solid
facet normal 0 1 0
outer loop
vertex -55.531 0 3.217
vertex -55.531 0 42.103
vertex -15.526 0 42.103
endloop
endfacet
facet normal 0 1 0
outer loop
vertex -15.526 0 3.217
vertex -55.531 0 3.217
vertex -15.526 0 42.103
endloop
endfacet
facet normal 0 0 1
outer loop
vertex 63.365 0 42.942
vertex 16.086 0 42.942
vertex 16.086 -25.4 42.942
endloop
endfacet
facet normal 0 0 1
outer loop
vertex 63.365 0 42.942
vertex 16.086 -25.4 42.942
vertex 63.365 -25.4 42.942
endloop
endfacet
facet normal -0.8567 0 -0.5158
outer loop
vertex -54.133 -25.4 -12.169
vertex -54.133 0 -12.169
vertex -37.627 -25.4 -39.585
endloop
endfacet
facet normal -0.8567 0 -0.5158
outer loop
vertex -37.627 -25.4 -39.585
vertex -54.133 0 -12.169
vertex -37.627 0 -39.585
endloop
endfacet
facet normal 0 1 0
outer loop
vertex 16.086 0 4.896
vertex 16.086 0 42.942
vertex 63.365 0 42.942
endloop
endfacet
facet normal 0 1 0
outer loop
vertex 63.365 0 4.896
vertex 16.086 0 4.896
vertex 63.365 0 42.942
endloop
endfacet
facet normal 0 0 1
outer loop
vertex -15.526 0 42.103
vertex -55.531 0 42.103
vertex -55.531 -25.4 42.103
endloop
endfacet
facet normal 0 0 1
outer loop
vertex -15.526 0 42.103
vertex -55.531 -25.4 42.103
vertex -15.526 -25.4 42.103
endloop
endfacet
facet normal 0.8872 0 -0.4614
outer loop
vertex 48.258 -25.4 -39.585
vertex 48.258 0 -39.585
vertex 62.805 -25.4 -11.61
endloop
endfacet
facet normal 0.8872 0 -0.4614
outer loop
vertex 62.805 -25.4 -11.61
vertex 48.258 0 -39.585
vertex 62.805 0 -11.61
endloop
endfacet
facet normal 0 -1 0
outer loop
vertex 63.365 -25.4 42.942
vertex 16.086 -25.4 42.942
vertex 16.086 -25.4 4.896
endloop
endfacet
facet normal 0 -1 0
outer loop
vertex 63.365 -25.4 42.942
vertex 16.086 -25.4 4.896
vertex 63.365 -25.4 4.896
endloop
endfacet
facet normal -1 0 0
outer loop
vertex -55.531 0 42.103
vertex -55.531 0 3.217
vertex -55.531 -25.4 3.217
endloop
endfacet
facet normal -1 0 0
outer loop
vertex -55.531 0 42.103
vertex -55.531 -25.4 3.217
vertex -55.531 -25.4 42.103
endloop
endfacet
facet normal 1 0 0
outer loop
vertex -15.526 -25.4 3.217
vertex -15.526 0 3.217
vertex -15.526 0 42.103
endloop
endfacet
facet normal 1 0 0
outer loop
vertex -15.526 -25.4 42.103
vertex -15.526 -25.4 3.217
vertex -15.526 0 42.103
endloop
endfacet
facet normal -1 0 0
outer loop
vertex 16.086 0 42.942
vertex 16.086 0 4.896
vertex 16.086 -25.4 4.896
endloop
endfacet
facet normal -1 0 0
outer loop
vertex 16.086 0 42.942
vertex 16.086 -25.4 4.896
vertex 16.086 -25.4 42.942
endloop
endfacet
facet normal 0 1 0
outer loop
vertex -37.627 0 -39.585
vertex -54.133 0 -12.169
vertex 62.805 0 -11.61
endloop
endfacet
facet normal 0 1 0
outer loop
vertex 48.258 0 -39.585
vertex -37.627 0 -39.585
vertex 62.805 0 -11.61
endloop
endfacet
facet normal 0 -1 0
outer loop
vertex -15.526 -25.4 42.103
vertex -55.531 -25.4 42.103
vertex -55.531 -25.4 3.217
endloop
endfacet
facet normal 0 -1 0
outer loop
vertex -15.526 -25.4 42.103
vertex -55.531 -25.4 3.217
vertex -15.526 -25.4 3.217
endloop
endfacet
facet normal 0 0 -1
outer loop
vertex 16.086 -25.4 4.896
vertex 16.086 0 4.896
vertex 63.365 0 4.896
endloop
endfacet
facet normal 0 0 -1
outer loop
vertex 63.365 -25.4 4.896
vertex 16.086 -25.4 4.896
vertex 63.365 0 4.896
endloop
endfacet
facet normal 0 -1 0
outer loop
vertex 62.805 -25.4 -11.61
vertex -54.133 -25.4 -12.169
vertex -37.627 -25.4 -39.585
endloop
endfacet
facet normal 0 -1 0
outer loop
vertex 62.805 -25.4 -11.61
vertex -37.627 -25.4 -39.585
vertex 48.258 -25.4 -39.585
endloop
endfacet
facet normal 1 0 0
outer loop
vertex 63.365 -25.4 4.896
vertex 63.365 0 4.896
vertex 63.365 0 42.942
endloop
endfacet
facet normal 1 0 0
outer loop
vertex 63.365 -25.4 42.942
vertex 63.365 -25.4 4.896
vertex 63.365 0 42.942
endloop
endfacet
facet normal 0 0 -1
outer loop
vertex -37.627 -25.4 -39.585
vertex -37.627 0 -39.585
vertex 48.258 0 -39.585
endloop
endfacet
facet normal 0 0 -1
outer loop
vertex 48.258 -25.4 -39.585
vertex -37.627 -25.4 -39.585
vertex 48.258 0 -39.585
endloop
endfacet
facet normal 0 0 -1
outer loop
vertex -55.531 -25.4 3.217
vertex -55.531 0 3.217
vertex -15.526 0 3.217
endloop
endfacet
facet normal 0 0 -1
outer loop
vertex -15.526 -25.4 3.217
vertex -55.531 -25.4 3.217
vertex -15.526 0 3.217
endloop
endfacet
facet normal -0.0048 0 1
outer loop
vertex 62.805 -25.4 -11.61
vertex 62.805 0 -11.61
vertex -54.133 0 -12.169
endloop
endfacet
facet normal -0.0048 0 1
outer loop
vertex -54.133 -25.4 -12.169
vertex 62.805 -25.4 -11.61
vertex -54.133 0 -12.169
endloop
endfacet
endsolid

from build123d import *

# Parameters (mm, degrees)
F0_W     = 40.004999
F0_H     = 38.885979
F1_DEPTH = 25.4
F2_W     = 47.278639
F2_H     = 38.046714
F3_DEPTH = 25.4
F5_DEPTH = 25.4


with BuildPart() as f1:
    # F0 (on Front) → F1 (new body)
    with BuildSketch(Plane.XZ):
        with Locations((-35.528917, 22.660175)):
            Rectangle(F0_W, F0_H)
    extrude(amount=F1_DEPTH)


with BuildPart() as f3:
    # F2 (on Front) → F3 (new body)
    with BuildSketch(Plane.XZ):
        with Locations((39.725245, 23.919074)):
            Rectangle(F2_W, F2_H)
    extrude(amount=F3_DEPTH)


with BuildPart() as f5:
    # F4 (on Front) → F5 (new body)
    with BuildSketch(Plane.XZ):
        Polygon((62.805057, -11.609843), (-54.13264, -12.169353), (-37.627079, -39.585367), (-7.133757, -39.585367), (37.627082, -39.585367), (48.257779, -39.585367), align=None)
    extrude(amount=F5_DEPTH)


solid = Compound([f1.part, f3.part, f5.part])
